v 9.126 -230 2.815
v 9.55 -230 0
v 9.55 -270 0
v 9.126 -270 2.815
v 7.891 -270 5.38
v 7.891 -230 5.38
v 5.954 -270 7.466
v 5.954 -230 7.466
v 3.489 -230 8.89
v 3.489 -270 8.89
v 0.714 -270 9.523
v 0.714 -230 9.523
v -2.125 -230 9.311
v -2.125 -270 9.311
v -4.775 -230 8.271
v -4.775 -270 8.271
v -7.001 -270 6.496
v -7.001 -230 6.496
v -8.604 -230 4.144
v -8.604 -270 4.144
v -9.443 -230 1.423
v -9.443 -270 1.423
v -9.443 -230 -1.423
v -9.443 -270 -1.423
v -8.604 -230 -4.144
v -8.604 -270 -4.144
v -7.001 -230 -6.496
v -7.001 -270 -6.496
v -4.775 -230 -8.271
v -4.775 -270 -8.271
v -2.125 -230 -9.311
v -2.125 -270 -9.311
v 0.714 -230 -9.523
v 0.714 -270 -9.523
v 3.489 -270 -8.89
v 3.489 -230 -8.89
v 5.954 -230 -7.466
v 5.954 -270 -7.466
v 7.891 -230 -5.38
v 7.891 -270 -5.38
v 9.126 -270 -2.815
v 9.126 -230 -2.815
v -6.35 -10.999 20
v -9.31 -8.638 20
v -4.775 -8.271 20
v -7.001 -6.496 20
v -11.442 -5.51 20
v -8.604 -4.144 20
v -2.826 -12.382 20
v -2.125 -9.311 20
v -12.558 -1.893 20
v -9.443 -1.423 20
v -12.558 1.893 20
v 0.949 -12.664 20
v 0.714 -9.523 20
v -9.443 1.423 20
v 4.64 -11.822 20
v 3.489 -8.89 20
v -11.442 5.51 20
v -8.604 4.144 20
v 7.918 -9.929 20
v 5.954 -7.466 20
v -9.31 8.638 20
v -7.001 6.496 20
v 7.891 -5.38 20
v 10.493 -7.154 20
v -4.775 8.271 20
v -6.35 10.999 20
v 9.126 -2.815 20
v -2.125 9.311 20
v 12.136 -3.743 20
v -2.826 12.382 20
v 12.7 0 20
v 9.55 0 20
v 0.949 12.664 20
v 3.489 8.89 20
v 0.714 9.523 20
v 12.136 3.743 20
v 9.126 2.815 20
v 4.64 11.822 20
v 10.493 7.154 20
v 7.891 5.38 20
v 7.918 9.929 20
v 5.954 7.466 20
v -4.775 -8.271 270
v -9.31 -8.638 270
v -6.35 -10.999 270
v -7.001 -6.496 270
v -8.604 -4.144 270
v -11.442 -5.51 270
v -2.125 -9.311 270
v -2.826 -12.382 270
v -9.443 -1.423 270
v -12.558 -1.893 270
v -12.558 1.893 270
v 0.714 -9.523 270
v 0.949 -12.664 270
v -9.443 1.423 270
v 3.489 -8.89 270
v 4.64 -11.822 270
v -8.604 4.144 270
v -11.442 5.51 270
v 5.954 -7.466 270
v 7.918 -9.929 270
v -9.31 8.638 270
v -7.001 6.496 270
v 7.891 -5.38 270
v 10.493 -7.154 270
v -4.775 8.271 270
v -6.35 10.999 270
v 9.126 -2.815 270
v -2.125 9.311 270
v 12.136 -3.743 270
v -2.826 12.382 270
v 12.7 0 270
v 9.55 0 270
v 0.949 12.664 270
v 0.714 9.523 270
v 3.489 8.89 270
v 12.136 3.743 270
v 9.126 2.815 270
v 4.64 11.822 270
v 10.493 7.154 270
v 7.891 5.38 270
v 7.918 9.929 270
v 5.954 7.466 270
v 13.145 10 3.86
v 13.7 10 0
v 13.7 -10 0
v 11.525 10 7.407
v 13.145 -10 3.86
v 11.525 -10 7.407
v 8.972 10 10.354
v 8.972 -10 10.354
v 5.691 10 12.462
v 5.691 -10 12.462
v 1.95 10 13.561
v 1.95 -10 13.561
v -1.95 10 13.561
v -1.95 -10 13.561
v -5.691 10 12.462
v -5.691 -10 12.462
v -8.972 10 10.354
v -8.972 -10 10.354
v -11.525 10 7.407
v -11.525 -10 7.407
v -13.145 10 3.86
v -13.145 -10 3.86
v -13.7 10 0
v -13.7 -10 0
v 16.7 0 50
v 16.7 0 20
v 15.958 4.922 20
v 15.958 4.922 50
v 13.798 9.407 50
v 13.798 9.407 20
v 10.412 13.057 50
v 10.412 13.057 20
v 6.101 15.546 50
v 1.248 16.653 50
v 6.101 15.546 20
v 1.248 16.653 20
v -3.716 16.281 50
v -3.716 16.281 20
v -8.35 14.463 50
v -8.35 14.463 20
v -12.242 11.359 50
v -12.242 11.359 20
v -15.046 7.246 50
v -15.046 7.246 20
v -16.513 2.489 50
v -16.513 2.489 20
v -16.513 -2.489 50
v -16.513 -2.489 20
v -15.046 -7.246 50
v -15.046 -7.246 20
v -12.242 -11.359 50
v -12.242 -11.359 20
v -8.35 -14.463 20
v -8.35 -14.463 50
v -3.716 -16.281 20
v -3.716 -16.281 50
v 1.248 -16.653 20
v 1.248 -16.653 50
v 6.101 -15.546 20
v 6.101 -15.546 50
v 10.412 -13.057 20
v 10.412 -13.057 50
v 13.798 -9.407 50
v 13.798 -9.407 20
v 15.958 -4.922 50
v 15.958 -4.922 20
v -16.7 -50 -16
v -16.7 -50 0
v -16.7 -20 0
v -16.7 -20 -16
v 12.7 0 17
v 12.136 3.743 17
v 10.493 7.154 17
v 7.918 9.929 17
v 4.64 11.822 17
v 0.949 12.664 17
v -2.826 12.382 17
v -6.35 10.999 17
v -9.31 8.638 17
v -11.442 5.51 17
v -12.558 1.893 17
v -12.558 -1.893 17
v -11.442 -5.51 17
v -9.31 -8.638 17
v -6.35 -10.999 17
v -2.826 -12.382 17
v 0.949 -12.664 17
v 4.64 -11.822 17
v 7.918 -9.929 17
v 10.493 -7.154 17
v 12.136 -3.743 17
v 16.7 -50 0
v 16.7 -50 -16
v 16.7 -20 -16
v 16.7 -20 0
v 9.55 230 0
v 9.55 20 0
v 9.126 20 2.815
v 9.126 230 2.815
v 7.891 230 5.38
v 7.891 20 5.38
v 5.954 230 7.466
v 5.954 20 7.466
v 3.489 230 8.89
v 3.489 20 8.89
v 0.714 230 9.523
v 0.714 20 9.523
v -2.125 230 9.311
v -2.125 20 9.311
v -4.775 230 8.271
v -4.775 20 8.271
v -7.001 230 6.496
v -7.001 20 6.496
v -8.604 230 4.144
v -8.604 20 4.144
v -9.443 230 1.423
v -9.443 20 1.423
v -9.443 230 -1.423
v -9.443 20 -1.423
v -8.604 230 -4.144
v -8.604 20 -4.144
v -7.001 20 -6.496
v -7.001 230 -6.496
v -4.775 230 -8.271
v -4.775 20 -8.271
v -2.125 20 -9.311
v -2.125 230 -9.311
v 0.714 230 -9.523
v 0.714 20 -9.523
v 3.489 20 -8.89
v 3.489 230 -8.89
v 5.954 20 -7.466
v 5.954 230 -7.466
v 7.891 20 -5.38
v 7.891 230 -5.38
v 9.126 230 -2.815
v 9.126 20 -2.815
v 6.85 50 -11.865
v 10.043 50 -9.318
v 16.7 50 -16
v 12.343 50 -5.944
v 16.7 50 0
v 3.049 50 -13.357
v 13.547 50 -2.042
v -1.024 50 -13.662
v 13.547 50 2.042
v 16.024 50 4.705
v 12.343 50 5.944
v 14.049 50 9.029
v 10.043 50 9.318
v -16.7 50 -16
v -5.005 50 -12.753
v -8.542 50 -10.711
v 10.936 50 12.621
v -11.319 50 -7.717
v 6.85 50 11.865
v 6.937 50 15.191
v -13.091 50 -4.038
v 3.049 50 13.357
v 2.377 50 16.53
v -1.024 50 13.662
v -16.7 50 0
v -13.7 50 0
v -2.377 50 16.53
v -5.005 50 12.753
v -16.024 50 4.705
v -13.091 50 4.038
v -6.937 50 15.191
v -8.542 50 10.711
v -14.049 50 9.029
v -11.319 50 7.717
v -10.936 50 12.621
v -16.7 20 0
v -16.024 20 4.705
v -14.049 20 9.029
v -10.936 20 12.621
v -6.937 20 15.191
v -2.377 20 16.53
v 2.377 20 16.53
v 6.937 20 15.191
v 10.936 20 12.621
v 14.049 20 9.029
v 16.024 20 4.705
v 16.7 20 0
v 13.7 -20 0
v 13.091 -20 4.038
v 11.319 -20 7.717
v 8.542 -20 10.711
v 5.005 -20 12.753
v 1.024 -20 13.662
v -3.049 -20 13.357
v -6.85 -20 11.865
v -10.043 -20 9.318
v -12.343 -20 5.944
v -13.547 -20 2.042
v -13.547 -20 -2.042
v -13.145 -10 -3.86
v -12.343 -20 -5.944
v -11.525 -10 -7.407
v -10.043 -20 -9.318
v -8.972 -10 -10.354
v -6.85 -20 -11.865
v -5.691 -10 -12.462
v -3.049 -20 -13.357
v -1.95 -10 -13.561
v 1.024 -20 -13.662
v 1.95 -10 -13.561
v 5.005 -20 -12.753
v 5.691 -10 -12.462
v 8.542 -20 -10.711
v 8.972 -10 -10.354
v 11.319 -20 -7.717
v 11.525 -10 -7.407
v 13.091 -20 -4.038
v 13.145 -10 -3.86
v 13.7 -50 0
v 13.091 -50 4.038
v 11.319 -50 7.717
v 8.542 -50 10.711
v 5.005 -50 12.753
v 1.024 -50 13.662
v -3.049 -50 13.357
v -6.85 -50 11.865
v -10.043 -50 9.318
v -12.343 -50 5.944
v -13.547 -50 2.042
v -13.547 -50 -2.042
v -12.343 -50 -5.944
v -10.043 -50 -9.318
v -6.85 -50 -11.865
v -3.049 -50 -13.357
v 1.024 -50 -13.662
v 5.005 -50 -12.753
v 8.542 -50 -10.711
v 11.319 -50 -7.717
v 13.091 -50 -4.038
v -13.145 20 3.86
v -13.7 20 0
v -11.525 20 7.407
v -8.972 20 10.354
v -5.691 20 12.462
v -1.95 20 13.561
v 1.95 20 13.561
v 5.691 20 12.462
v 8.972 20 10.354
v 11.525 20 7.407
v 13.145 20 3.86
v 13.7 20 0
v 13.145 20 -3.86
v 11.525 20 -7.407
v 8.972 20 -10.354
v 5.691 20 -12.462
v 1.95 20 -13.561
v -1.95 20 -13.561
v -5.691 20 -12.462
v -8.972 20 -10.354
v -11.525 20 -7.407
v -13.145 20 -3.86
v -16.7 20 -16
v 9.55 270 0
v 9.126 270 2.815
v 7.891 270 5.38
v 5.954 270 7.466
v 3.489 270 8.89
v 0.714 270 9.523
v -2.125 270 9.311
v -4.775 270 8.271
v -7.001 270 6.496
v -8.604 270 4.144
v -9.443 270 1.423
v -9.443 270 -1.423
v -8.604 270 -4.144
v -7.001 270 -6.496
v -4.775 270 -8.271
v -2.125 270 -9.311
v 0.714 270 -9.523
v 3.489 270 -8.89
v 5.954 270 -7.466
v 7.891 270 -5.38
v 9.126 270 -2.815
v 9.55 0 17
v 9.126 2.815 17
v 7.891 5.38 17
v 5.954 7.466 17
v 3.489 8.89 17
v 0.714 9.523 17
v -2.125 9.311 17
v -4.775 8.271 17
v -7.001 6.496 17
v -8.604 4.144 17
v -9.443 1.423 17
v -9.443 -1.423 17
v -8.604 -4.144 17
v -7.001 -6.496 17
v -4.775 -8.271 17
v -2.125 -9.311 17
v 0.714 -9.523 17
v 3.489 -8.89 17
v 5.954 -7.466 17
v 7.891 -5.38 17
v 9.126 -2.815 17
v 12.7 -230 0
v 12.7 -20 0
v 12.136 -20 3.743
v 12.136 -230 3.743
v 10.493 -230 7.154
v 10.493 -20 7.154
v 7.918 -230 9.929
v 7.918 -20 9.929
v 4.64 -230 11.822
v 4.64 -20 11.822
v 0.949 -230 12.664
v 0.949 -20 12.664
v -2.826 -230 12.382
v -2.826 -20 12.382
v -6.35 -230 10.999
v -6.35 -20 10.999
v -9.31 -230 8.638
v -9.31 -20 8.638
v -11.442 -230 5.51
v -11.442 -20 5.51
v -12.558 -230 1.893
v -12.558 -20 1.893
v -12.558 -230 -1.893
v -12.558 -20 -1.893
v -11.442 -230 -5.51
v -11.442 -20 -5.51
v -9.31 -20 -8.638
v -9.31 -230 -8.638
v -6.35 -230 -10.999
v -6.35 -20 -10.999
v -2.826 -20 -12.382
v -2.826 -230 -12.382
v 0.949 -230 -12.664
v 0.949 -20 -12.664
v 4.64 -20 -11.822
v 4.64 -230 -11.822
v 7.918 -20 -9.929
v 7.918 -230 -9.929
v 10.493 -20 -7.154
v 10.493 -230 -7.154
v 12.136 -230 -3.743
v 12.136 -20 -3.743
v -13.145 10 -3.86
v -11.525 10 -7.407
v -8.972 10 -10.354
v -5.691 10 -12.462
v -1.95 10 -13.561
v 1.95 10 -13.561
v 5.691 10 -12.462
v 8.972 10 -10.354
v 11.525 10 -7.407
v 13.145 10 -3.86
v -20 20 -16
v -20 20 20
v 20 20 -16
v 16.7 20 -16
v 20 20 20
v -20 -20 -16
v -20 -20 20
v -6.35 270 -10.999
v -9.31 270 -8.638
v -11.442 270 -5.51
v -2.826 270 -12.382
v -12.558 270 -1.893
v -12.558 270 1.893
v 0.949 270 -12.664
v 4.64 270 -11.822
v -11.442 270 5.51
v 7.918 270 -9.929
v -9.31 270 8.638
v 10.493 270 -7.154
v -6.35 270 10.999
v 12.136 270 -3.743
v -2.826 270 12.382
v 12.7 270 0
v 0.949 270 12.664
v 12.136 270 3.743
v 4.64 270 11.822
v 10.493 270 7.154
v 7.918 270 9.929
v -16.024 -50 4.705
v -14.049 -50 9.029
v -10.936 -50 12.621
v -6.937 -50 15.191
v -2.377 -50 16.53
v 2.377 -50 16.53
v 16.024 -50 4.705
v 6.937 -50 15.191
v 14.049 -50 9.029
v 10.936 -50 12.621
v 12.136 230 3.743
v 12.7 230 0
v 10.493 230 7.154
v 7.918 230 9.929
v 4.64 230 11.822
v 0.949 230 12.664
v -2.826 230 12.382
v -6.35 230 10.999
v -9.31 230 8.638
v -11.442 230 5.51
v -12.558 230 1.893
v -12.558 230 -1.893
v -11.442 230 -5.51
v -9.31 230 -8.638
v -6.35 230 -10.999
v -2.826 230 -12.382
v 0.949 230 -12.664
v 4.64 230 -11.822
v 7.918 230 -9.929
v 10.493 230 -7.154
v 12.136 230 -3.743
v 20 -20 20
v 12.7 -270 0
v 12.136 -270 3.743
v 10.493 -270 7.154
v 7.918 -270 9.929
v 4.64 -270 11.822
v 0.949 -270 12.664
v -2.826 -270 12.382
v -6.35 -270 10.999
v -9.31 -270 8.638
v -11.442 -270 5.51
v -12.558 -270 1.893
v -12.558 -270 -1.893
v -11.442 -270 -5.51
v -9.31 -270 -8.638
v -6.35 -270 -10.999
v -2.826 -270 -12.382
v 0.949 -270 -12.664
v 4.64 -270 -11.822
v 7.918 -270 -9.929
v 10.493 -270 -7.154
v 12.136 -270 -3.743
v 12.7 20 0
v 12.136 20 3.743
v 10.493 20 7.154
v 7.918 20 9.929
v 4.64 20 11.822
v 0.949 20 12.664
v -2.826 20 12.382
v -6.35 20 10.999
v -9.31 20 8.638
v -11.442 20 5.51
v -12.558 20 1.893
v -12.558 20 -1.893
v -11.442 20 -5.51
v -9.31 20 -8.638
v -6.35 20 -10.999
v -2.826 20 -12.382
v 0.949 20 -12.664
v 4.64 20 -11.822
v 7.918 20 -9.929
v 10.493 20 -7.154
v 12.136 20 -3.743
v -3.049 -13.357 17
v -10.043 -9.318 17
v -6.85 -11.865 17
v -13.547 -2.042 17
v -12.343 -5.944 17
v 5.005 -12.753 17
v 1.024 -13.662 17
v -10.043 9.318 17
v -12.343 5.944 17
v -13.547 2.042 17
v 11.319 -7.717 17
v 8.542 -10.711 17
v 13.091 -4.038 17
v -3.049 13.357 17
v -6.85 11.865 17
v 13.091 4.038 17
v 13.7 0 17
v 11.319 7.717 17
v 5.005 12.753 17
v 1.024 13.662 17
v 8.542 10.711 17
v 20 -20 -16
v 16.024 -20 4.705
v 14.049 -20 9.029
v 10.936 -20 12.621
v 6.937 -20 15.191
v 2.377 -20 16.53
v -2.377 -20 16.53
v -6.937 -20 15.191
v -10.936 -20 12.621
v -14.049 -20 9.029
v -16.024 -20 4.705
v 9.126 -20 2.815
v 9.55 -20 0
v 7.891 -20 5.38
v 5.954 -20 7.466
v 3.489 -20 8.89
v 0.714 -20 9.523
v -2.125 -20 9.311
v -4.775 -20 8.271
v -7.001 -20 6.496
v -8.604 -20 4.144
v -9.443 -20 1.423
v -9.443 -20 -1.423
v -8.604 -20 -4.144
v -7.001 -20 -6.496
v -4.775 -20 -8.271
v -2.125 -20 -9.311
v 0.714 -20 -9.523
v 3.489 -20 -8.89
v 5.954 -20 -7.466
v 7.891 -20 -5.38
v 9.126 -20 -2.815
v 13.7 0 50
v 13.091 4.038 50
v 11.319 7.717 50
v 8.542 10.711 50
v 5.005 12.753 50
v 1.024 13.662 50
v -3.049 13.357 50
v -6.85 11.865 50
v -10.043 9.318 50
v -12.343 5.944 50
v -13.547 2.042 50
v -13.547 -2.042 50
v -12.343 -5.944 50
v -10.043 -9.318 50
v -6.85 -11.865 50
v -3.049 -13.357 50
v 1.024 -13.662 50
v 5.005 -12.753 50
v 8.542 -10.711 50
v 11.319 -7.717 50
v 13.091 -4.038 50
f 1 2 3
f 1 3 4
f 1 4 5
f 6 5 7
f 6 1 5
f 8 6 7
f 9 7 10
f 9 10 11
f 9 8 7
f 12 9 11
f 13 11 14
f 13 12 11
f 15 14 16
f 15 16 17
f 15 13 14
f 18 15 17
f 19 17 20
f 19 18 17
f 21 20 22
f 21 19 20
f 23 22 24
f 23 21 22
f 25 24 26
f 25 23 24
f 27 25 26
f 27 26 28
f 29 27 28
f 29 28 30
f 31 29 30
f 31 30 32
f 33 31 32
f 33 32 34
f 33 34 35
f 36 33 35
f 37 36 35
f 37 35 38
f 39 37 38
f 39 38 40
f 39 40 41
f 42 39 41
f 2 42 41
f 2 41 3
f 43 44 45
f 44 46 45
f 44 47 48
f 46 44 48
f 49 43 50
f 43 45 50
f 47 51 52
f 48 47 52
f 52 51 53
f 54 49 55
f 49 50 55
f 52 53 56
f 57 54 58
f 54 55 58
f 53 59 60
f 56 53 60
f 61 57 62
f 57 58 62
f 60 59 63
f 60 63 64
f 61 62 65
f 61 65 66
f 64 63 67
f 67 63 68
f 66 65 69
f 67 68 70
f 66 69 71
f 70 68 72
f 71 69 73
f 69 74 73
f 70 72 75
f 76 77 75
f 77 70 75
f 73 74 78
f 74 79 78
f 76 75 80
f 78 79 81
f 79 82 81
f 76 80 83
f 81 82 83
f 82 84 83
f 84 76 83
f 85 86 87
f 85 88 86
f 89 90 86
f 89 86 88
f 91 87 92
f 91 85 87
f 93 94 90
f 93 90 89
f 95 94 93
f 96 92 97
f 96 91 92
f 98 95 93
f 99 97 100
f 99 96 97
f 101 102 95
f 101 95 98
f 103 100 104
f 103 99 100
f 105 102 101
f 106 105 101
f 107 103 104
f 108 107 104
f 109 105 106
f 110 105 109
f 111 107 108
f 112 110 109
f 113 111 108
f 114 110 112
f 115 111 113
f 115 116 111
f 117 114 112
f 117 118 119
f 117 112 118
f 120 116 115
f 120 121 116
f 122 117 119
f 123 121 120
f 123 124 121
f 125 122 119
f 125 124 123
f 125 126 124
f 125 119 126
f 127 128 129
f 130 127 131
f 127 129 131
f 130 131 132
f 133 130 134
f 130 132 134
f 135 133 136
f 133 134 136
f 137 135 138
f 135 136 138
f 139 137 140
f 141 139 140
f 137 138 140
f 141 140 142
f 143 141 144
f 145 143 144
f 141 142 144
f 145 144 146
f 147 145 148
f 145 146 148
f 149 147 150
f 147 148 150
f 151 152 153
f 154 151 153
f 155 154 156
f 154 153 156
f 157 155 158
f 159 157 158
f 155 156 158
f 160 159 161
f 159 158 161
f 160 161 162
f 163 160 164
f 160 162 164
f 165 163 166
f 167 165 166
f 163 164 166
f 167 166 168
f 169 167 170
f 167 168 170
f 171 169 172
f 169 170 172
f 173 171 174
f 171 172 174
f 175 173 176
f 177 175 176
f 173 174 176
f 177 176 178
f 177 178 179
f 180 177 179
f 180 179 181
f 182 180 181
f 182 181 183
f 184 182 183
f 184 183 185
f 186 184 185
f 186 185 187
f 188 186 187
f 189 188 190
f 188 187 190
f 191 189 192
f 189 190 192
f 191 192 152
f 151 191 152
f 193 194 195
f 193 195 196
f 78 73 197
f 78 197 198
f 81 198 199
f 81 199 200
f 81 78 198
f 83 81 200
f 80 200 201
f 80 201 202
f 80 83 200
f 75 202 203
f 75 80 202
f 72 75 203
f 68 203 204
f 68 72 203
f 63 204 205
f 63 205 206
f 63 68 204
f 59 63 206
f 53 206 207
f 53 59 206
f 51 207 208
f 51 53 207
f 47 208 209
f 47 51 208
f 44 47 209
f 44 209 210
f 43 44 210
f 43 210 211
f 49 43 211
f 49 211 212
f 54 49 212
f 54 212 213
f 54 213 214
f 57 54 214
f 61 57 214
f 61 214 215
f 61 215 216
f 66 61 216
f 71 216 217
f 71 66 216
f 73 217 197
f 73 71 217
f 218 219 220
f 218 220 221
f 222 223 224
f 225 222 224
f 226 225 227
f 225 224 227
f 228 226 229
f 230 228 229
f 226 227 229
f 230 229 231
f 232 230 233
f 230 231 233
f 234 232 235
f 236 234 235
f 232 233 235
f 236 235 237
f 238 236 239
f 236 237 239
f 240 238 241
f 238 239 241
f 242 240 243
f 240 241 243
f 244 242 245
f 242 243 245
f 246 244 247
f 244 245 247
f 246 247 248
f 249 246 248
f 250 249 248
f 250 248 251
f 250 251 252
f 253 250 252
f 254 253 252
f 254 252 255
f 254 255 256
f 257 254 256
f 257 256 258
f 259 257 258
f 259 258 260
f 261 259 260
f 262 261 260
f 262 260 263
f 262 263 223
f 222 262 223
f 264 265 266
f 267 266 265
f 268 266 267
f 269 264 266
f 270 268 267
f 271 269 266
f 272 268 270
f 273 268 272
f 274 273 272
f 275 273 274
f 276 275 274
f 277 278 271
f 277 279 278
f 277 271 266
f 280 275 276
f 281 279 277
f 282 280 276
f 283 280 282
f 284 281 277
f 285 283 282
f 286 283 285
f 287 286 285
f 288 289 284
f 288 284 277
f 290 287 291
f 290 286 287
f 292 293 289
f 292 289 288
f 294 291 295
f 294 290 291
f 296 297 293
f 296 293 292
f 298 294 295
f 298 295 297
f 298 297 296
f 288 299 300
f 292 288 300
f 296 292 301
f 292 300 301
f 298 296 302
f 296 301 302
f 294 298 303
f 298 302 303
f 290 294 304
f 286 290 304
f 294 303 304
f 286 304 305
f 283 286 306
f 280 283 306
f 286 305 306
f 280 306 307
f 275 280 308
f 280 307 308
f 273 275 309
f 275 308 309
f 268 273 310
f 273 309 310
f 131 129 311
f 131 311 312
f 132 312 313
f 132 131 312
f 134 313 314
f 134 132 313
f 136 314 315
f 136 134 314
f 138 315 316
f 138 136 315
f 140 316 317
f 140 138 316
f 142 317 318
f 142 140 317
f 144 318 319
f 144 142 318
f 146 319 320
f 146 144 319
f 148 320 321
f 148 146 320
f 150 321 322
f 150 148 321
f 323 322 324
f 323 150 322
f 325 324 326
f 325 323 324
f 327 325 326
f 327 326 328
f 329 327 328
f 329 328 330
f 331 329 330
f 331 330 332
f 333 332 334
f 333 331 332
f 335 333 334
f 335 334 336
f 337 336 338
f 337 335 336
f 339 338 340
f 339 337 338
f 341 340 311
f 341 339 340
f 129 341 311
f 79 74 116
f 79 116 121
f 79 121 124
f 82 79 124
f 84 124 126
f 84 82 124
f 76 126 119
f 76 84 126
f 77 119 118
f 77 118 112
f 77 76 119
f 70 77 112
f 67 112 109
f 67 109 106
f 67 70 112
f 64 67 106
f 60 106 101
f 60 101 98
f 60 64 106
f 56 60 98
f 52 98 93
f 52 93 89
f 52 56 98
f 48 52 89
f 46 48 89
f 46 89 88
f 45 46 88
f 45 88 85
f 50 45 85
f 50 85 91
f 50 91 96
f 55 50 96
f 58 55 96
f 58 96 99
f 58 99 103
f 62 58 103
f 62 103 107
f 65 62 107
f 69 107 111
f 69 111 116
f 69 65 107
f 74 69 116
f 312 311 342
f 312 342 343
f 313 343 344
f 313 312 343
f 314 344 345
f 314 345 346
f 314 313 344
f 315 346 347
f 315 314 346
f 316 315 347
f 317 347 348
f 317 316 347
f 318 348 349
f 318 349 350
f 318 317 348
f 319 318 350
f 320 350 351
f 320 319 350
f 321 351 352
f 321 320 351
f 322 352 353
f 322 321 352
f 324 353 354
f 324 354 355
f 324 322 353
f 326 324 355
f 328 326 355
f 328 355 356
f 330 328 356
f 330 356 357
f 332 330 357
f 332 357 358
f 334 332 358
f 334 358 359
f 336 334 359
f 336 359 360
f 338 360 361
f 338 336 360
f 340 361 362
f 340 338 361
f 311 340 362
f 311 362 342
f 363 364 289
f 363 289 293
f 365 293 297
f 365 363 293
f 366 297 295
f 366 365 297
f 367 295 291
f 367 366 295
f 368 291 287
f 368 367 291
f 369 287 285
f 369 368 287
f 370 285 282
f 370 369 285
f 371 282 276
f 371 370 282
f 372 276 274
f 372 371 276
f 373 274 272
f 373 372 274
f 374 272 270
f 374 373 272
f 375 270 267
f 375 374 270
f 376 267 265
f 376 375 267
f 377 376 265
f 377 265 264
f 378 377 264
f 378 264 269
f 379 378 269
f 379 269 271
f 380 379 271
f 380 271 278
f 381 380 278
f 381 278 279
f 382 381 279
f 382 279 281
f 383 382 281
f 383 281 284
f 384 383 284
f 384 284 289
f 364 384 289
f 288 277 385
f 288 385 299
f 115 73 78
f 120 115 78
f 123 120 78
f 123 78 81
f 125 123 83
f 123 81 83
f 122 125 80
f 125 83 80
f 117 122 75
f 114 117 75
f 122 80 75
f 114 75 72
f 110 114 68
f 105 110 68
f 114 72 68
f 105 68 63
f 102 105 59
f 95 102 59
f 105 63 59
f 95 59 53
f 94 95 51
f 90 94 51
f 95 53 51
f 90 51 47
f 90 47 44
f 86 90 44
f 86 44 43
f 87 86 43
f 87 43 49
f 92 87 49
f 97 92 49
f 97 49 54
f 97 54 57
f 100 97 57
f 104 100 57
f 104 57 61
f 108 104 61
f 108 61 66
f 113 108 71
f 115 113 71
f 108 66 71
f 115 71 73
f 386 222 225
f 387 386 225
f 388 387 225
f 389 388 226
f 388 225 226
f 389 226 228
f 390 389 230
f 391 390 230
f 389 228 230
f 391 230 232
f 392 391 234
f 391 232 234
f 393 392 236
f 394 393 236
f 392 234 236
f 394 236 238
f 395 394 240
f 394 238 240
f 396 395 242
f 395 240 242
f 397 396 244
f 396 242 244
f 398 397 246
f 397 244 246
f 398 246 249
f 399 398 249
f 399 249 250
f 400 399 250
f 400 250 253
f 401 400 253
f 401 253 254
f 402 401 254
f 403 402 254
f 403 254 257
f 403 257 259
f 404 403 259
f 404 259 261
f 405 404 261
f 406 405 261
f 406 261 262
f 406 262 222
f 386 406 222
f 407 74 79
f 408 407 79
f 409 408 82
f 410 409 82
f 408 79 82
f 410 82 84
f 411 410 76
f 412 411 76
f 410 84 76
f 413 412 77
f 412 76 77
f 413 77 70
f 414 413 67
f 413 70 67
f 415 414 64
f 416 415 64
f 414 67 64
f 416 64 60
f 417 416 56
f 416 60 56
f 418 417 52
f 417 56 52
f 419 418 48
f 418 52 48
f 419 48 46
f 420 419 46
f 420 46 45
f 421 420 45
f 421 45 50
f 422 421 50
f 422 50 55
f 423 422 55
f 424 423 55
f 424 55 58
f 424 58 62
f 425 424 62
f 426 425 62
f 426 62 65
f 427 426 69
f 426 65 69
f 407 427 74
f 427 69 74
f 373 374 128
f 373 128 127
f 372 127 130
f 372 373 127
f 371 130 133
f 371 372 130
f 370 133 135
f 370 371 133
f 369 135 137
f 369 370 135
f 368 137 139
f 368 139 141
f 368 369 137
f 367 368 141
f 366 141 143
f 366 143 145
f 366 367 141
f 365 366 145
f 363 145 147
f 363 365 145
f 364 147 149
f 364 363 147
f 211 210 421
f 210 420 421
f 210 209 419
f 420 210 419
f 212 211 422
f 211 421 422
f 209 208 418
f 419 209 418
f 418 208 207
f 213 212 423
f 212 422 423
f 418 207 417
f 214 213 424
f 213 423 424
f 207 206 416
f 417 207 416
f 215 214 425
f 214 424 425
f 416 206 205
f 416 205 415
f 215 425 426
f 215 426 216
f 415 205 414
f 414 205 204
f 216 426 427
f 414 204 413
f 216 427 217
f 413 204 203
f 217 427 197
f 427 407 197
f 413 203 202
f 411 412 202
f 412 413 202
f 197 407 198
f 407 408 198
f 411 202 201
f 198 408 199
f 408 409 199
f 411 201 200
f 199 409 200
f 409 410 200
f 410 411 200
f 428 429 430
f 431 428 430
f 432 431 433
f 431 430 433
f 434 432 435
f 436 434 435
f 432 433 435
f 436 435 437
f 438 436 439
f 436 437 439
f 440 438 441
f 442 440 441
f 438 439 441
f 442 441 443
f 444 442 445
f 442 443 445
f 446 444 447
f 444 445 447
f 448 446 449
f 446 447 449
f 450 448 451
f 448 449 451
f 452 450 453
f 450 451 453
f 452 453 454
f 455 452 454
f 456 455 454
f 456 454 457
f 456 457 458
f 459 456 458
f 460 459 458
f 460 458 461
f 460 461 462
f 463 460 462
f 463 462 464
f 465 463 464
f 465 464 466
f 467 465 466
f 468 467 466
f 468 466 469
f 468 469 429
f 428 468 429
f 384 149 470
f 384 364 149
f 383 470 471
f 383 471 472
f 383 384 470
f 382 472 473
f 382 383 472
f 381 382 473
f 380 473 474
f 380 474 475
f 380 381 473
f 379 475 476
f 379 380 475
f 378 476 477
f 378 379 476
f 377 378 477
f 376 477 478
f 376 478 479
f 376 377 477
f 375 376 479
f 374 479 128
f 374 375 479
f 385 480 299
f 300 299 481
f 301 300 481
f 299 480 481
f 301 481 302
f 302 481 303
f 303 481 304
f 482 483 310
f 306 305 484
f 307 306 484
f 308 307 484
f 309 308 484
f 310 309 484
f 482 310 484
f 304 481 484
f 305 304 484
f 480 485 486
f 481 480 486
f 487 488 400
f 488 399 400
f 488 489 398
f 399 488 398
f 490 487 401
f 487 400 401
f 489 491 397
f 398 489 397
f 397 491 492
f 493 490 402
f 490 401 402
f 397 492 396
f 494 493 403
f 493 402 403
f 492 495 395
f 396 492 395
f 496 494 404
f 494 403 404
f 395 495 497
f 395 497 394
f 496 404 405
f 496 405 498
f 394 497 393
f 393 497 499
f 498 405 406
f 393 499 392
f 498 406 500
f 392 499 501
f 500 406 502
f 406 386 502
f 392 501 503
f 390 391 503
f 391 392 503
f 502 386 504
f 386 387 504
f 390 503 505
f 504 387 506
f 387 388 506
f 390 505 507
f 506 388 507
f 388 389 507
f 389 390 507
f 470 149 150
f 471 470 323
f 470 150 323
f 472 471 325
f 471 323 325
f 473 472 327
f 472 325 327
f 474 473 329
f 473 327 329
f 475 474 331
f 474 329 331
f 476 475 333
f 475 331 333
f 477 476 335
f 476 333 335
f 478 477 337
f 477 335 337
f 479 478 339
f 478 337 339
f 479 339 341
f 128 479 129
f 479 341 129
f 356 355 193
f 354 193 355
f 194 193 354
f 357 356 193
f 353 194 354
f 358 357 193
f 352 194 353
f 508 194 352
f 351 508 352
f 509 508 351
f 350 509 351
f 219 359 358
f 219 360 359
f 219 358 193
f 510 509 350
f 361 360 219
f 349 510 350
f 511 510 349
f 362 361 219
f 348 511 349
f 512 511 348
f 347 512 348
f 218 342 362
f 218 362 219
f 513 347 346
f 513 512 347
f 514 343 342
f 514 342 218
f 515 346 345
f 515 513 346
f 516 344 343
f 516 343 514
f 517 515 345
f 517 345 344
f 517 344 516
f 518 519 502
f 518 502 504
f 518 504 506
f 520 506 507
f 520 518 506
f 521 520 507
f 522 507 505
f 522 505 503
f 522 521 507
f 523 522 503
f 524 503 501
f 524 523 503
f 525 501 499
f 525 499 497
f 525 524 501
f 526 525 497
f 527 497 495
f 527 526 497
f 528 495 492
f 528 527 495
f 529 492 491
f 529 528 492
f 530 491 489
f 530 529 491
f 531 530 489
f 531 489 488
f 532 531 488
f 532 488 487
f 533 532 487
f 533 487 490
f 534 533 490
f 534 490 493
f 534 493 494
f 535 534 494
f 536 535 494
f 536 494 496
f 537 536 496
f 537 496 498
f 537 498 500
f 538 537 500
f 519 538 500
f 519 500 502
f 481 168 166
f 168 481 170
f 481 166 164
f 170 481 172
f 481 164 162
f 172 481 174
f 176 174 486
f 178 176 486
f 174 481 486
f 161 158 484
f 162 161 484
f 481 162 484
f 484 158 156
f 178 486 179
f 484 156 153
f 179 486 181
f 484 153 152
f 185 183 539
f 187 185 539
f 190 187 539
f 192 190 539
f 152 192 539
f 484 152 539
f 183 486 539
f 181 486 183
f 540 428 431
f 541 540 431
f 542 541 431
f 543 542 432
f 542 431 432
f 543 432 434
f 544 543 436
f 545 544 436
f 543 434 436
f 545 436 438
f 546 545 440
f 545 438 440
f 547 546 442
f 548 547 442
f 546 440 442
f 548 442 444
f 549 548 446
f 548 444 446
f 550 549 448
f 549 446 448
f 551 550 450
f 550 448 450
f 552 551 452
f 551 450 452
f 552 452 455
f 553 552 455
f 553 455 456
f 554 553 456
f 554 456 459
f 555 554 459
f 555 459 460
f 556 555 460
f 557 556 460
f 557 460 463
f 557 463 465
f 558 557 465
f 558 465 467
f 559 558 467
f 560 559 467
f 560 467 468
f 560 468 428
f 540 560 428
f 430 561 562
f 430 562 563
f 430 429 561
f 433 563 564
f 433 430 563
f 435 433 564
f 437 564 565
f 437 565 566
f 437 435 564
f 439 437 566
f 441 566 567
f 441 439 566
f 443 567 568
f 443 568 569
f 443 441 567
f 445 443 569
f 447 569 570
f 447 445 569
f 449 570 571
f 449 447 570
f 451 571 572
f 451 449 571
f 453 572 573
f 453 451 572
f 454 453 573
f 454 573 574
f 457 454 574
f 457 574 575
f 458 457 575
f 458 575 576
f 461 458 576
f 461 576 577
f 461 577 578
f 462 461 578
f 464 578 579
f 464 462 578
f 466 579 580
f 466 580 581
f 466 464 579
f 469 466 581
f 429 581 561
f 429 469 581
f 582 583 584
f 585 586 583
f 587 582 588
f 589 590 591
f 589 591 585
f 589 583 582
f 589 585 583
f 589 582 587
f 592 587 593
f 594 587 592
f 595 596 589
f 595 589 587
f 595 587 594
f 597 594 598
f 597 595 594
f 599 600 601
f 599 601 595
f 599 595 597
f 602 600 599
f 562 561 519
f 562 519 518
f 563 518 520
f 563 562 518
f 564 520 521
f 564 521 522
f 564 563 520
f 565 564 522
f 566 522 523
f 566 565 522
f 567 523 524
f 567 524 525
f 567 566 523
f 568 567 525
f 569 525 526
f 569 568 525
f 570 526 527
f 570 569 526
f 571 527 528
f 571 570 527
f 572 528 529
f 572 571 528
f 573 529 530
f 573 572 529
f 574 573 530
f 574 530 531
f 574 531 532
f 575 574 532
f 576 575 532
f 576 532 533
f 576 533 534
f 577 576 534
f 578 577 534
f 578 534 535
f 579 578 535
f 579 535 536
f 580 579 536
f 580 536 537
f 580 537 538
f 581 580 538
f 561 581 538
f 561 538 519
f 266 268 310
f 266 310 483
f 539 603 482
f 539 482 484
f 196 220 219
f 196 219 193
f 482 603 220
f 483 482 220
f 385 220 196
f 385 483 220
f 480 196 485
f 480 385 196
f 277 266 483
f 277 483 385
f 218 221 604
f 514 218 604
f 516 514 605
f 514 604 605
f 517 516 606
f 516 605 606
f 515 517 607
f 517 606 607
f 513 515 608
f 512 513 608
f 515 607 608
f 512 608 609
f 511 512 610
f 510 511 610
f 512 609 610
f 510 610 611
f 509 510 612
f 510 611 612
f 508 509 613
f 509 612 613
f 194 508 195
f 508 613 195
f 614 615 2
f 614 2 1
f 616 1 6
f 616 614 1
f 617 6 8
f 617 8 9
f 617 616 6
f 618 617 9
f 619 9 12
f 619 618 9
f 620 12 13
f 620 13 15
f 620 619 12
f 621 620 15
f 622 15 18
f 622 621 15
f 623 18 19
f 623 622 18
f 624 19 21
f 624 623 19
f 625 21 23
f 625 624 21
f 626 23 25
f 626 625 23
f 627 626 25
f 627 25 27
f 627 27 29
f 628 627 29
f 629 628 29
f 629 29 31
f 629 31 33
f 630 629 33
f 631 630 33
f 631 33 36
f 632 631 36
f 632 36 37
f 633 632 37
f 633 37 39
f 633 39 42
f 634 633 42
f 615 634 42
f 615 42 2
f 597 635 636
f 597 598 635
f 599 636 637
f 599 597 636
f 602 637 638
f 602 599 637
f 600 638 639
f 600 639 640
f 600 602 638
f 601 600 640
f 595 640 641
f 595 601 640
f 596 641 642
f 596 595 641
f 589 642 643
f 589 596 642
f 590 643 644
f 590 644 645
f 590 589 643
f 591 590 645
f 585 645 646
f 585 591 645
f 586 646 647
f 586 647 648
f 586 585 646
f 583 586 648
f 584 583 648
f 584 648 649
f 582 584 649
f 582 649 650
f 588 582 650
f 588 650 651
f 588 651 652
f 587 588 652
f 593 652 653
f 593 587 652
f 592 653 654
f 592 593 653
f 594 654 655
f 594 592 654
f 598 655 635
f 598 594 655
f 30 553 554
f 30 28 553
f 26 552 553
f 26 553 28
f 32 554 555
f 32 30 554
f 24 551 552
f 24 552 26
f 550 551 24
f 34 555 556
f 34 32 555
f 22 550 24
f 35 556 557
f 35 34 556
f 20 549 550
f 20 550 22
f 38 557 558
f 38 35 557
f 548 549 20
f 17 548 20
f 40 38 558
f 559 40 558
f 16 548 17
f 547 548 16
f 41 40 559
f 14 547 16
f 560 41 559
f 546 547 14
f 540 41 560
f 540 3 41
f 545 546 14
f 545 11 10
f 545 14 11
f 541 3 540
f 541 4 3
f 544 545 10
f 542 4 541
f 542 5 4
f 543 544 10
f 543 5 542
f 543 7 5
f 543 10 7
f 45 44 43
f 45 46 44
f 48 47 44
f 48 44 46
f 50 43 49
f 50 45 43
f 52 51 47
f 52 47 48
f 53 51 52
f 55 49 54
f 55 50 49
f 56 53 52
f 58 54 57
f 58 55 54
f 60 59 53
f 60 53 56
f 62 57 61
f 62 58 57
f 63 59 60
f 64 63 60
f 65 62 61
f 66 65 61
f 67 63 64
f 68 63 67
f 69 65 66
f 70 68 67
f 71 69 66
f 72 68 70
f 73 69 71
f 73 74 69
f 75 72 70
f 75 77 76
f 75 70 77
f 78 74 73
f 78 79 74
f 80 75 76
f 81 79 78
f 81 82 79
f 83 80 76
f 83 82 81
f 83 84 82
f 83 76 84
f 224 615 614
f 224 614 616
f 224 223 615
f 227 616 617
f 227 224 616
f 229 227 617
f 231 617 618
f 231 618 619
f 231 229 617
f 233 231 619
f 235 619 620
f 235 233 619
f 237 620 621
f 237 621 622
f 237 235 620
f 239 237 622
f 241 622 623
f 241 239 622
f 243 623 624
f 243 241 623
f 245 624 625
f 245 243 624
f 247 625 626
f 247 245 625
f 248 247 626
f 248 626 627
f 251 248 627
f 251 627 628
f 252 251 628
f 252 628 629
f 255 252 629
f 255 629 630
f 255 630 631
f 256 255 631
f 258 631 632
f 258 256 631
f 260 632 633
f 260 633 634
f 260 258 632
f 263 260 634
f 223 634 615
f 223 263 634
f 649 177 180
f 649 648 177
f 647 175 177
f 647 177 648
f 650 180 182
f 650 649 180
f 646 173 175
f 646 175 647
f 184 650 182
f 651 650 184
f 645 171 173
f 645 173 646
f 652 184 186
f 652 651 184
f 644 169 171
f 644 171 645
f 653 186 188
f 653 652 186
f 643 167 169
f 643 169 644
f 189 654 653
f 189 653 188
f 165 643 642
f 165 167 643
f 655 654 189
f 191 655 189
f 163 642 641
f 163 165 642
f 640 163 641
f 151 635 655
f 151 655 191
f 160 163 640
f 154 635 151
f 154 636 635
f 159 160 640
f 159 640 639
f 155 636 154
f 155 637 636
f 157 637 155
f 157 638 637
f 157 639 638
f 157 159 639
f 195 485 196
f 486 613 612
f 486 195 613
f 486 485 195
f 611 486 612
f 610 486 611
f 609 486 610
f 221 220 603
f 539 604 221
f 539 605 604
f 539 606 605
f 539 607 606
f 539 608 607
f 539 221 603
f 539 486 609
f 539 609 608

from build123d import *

# Parameters (mm, degrees)
F0_W      = 40
F0_H      = 40
F0_R      = 16.7
F0_R_2    = 13.7
F1_DEPTH  = 20
F0_R_3    = 12.7
F0_R_4    = 9.55
F2_R      = 16.7
F2_R_2    = 13.7
F3_R      = 16.7
F3_R_2    = 13.7
F4_DEPTH  = 30
F5_DEPTH  = 250
F6_R      = 13.7
F6_R_2    = 12.7
F6_R_3    = 9.55
F7_DEPTH  = 3
F8_DEPTH  = 250
F6_R_4    = 16.7
F9_DEPTH  = 30
F10_DEPTH = 3
F13_DEPTH = 30
F14_DEPTH = 30
F15_DEPTH = 4


# Not quite as in the source:
# - after a boolean that leaves OpenCascade's solid faulty, fix() repairs it


with BuildPart() as f1:
    # F0 (on Front) → F1 (new body, symmetric)
    with BuildSketch(Plane.XZ):
        Rectangle(F0_W, F0_H)
        Circle(F0_R, mode=Mode.SUBTRACT)
        Circle(F0_R)
        Circle(F0_R_2, mode=Mode.SUBTRACT)
    extrude(amount=F1_DEPTH, both=True)

    # F2 (on face) + F3 (on face) → F4 (join, symmetric)
    with BuildSketch(Plane.XZ.offset(20)):
        Circle(F2_R)
        Circle(F2_R_2, mode=Mode.SUBTRACT)
    with BuildSketch(Plane(origin=(0, 20, 0), x_dir=(-1, 0, 0), z_dir=(0, 1, 0))):
        Circle(F3_R)
        Circle(F3_R_2, mode=Mode.SUBTRACT)
    extrude(amount=F4_DEPTH, both=True, dir=(0, -1, 0))

    add(f1.part.fix(), mode=Mode.REPLACE)

    # F6 (on face) → F7 (cut)
    with BuildSketch(Plane.XY.offset(20)):
        Circle(F6_R)
        Circle(F6_R_2, mode=Mode.SUBTRACT)
        Circle(F6_R_2)
        Circle(F6_R_3, mode=Mode.SUBTRACT)
        Circle(F6_R_3)
    extrude(amount=-F7_DEPTH, mode=Mode.SUBTRACT)

    # F6 (on face) → F9 (join)
    with BuildSketch(Plane.XY.offset(20)):
        Circle(F6_R_4)
        Circle(F6_R, mode=Mode.SUBTRACT)
    extrude(amount=F9_DEPTH)

    # F11 (on face) → F13 (join, through all)
    with BuildSketch(Plane.XZ.offset(50)):
        with BuildLine():
            ThreePointArc((16.7, 0), (0, -16.7), (-16.7, 0))
            Line((-16.7, 0), (-16.7, -20))
            Line((-16.7, -20), (16.7, -20))
            Line((16.7, -20), (16.7, 0))
        make_face()
    extrude(amount=-F13_DEPTH)

    # F12 (on face) → F14 (join, through all)
    with BuildSketch(Plane(origin=(0, 50, 0), x_dir=(-1, 0, 0), z_dir=(0, 1, 0))):
        with BuildLine():
            ThreePointArc((16.7, 0), (0, -16.7), (-16.7, 0))
            Line((-16.7, 0), (-16.7, -20))
            Line((-16.7, -20), (16.7, -20))
            Line((16.7, -20), (16.7, 0))
        make_face()
    extrude(amount=-F14_DEPTH)

    # F15 (cut): a face of the model
    f15_faces = [f1.faces().sort_by_distance(p)[0] for p in [
        (0, 0, -20),
    ]]
    extrude(f15_faces, amount=-F15_DEPTH, mode=Mode.SUBTRACT)


with BuildPart() as f1b:
    # F0 (on Front) → F1, piece 2 (new body, symmetric)
    with BuildSketch(Plane.XZ):
        Circle(F0_R_3)
        Circle(F0_R_4, mode=Mode.SUBTRACT)
    extrude(amount=F1_DEPTH, both=True)

    # F5 (add, symmetric): faces of the model
    f5_faces = [f1b.faces().sort_by_distance(p)[0] for p in [
        (-12.3407897552, -20, 0),
        (-12.3407897552, 20, 0),
    ]]
    extrude(f5_faces, amount=F5_DEPTH, both=True, dir=(0, -1, 0))


with BuildPart() as f8:
    # F6 (on face) → F8 (new body)
    with BuildSketch(Plane.XY.offset(20)):
        Circle(F6_R_2)
        Circle(F6_R_3, mode=Mode.SUBTRACT)
    extrude(amount=F8_DEPTH)


with BuildPart() as f10:
    # F6 (on face) → F10 (new body)
    with BuildSketch(Plane.XY.offset(20)):
        Circle(F6_R_2)
        Circle(F6_R_3, mode=Mode.SUBTRACT)
    extrude(amount=-F10_DEPTH)


solid = Compound([f1.part, f1b.part, f8.part, f10.part])
